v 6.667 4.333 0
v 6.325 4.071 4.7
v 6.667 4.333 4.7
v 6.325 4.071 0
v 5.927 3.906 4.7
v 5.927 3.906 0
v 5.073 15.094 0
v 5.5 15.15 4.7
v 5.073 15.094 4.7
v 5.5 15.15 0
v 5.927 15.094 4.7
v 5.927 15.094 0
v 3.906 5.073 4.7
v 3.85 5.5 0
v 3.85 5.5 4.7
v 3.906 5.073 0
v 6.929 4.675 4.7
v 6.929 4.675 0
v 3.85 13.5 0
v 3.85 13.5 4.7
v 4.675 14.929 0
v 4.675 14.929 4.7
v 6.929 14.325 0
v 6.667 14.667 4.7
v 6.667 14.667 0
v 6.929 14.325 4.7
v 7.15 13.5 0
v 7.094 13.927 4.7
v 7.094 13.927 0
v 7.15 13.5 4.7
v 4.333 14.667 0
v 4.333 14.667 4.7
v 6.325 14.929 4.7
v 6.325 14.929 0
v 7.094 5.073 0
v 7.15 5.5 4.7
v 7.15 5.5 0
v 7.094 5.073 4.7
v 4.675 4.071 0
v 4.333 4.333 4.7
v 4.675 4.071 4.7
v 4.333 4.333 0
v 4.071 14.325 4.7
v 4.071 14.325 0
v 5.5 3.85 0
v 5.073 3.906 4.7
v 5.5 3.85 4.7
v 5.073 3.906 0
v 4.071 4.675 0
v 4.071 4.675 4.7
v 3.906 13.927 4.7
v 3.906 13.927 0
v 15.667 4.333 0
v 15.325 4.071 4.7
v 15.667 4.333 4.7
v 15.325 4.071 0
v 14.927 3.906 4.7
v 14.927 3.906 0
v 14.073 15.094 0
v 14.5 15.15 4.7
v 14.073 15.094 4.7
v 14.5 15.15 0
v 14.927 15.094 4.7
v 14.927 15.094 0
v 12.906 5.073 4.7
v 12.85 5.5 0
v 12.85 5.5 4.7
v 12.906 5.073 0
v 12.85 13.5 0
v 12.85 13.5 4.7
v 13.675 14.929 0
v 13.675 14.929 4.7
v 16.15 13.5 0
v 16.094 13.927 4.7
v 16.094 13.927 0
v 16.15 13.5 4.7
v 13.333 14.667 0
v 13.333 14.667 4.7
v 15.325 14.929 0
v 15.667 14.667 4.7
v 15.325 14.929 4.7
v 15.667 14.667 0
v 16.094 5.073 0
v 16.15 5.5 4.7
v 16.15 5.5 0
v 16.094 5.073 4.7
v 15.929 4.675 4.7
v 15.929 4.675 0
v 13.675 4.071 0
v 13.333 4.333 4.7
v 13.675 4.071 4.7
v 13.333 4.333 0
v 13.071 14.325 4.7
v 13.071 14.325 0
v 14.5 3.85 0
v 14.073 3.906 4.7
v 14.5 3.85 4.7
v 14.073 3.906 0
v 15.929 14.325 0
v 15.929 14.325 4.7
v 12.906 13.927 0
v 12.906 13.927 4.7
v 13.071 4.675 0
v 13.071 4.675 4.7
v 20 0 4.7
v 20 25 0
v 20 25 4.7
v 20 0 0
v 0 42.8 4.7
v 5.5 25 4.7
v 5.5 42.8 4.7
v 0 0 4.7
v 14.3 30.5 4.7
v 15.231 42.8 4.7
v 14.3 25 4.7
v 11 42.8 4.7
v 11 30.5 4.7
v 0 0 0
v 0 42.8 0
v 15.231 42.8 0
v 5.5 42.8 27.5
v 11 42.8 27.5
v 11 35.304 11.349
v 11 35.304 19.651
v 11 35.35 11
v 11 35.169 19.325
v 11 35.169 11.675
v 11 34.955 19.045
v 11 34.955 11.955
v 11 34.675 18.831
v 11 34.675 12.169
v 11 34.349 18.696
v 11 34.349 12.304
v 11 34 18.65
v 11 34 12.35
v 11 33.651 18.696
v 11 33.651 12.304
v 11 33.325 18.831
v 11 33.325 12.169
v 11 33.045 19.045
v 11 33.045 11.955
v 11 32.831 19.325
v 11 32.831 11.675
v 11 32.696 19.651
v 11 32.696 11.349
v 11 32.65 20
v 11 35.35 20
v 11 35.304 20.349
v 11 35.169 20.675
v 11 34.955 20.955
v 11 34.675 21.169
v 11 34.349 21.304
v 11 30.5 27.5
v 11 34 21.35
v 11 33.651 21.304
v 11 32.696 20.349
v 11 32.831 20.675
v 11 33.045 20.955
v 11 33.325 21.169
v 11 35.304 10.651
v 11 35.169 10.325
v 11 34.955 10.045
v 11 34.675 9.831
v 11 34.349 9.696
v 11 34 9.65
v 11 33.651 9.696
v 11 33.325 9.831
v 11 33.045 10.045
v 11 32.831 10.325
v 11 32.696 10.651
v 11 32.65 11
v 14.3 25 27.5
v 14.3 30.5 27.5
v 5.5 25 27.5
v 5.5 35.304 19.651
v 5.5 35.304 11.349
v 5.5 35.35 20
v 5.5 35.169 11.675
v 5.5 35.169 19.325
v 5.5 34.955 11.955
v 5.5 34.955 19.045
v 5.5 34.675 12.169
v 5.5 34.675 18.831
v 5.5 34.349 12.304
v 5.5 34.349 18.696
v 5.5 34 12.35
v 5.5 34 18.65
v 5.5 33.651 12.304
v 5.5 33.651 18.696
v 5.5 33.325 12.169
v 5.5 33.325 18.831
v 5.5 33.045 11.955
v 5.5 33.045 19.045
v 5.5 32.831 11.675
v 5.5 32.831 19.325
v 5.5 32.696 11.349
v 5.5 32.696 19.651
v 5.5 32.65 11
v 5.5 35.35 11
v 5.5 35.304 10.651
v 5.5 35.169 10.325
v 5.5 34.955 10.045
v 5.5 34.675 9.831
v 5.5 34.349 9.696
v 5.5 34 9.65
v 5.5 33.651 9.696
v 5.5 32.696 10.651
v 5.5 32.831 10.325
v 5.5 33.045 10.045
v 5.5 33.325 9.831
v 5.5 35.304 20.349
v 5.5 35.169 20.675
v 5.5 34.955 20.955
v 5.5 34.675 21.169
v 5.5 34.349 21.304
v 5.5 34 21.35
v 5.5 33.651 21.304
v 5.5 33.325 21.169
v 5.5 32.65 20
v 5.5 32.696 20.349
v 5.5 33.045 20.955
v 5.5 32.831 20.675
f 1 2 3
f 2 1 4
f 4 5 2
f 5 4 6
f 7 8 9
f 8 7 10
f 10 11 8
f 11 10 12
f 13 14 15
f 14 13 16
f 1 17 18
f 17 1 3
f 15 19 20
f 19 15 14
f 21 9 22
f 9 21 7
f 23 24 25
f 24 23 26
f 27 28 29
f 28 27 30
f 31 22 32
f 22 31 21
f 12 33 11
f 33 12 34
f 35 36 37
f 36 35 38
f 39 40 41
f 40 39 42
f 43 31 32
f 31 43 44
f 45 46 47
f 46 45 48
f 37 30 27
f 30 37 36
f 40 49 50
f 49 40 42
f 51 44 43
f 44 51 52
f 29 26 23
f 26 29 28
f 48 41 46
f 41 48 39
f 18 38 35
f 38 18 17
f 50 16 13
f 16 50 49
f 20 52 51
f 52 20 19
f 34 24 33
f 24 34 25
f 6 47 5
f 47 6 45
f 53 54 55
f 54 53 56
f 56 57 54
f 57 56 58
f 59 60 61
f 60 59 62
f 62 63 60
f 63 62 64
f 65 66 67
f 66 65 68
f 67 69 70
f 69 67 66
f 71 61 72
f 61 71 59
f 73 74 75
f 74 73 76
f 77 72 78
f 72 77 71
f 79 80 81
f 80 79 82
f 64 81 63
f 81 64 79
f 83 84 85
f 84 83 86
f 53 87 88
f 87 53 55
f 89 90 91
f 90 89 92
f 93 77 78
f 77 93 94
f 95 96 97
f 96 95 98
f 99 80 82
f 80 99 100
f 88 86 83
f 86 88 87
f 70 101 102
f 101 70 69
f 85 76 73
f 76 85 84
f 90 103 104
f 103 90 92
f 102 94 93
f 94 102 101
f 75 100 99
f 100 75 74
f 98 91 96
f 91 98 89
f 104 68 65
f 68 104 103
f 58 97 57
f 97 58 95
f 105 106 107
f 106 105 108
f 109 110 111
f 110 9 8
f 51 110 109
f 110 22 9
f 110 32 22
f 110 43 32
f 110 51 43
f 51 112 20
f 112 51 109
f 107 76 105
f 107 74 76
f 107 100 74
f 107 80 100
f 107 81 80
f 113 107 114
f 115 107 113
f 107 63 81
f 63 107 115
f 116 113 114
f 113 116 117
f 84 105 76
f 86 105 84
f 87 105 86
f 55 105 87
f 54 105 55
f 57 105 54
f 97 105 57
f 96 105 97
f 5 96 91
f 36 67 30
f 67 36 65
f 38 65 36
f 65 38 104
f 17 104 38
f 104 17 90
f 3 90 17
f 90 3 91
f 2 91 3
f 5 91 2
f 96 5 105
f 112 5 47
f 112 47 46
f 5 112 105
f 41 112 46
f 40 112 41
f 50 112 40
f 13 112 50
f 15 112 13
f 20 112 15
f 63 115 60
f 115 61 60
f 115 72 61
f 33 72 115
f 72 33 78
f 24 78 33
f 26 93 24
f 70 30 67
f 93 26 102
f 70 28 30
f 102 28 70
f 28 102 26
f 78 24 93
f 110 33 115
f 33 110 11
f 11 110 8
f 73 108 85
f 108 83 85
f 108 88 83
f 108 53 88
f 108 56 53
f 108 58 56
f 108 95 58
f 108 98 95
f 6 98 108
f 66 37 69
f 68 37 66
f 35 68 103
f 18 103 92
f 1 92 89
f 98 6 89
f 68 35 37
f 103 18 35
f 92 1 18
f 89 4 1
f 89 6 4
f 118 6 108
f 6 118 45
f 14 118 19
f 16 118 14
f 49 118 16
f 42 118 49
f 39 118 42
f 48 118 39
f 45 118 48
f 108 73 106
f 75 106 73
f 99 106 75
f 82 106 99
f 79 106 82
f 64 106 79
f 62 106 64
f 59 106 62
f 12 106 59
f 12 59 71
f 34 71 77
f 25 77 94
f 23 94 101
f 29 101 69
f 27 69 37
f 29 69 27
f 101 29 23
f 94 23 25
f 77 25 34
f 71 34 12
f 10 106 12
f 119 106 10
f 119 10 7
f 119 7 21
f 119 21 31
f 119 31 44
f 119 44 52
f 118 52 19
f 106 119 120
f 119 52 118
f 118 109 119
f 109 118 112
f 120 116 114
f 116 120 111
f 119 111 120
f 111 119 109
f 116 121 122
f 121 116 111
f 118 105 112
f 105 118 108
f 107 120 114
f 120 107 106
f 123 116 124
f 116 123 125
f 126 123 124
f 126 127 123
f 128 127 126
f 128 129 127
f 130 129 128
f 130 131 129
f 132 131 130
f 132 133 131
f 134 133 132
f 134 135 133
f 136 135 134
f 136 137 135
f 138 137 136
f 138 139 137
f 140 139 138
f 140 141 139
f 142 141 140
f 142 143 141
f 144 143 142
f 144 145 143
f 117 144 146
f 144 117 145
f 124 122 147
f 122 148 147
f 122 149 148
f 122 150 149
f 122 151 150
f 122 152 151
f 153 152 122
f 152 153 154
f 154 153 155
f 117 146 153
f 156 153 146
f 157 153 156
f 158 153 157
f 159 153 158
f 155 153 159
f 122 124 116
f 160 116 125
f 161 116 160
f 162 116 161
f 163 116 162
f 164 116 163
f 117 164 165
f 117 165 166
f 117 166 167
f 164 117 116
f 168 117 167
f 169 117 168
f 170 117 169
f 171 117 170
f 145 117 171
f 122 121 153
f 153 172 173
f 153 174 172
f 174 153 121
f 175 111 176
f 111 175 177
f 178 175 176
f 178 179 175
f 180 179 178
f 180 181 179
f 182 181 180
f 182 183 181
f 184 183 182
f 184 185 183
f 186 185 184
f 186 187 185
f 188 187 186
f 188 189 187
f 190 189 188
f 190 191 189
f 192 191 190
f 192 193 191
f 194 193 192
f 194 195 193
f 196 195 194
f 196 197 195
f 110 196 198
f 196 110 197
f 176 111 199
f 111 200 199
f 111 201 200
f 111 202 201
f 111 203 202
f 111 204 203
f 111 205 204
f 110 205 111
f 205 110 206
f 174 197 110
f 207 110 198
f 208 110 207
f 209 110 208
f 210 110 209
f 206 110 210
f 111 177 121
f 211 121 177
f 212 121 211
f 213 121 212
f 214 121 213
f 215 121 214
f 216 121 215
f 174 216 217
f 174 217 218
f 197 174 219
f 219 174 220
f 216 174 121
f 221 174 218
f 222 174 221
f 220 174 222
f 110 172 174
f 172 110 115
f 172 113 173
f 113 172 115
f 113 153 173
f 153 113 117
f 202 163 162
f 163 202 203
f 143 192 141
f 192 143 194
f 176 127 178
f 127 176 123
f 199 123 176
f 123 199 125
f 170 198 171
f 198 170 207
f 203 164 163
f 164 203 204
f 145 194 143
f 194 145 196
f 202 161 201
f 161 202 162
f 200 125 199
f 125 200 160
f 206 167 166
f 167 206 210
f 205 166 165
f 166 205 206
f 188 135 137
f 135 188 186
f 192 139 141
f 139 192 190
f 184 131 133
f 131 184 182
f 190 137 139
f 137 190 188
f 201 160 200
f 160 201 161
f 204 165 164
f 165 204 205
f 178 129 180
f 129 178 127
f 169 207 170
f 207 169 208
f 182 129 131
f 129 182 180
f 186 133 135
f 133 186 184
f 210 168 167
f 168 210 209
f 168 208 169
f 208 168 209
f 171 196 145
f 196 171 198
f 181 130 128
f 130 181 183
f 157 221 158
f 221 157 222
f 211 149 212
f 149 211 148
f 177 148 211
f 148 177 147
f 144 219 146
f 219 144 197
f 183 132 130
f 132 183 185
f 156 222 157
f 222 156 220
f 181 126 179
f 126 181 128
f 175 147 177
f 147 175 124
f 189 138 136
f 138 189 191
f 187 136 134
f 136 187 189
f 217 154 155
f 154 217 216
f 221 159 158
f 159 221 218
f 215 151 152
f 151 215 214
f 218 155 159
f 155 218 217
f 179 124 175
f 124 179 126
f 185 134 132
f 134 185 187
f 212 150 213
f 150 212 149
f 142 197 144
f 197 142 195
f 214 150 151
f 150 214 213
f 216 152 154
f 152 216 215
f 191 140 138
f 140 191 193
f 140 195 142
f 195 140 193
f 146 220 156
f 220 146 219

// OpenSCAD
// y_endstop_holder.scad
// 2014-04-18 Aristofor K
// reprap asimov : support pour y-endstop

d1=1;
d2=2;

$fn=24;

module gliziere() {
	hull() {
		translate([0,8,-d1])
			cylinder(r=3.3/2,h=4.7+d2);
		cylinder(r=3.3/2,h=4.7+d2);
	}
}

module base() {
	difference() {
		cube([20,25+17.8,4.7]);
		translate([20,25,-d1])
			rotate([0,0,15])
			cube([20,25+17.8,4.7+d2]);

		translate([5.5,5.5,0]) {
			gliziere();
			translate([9,0,0])
				gliziere();
		}
	}
}

module holder() {
	difference() {

		union() {
			cube([5.5,17.8,27.5]);
			translate([5.5,0,0])
				cube([3.3,5.5,27.5]);
		}

		translate([-d1,9,11])
			rotate([90,0,90])
			cylinder(r=2.7/2,h=5.5+d2);
		translate([-d1,9,20])
			rotate([90,0,90])
			cylinder(r=2.7/2,h=5.5+d2);

	}	
}


base();
translate([5.5,25,0])
	holder();
